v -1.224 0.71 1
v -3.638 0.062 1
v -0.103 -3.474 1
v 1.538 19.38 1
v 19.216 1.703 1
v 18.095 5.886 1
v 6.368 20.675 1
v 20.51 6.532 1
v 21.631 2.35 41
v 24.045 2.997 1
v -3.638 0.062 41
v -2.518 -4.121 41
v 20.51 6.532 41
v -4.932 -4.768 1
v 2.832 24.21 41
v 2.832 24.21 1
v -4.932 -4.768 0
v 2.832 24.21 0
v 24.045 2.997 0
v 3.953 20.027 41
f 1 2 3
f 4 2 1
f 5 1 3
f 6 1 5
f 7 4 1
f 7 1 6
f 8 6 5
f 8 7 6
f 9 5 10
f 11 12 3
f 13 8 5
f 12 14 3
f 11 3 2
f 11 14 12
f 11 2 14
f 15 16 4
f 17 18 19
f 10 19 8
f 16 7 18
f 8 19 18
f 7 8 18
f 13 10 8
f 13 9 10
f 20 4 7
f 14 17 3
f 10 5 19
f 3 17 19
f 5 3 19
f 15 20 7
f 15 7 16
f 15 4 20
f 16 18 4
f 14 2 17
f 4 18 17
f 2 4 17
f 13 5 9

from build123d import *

# Parameters (mm, degrees)
F1_DEPTH = 1
F3_DEPTH = 40
F5_DEPTH = 4.3311270189
F7_DEPTH = 25


with BuildPart() as f1:
    # F0 (on Top) → F1 (new body)
    with BuildSketch(Plane.XY):
        Polygon((2.8322214563, 24.2100603602), (-4.9323490894, -4.7677146448), (24.045425483, 2.9968575157), align=None)
    extrude(amount=F1_DEPTH)

    # F2 (on face) → F3 (join)
    with BuildSketch(Plane.XY.offset(1)):
        Polygon((-3.6382539984, 0.0619145227), (-4.9323490894, -4.7677146448), (-0.102719994, -3.4736192847), align=None)
        Polygon((6.3677554607, 20.6745265528), (2.8322214563, 24.2100603602), (1.5381263653, 19.3804311927), align=None)
        Polygon((19.2157963876, 1.7027621556), (24.045425483, 2.9968575157), (20.5098914785, 6.5323913231), align=None)
    extrude(amount=F3_DEPTH)

    # F4 (on face) → F5 (cut, through all)
    with BuildSketch(Plane(origin=(0.8615239687, -3.2152508648, 0), x_dir=(0.9659258191, 0.258819072, 0), z_dir=(0.258819072, -0.9659258191, 0))):
        Polygon((-5.9982588141, 41), (-5.9982588141, 1), (-3.4982588141, 41), align=None)
        Polygon((21.5017411859, 41), (24.0017411859, 1), (24.0017411859, 41), align=None)
        Polygon((-0.9982588141, 41), (-3.4982588141, 41), (-0.9982588141, 1), align=None)
        Polygon((19.0017411859, 41), (19.0017411859, 1), (21.5017411859, 41), align=None)
    extrude(amount=-F5_DEPTH, mode=Mode.SUBTRACT)

    # F6 (on face) → F7 (cut)
    with BuildSketch(Plane(origin=(-4.742073315, 17.6976565725, 0), x_dir=(0.9659258191, 0.258819072, 0), z_dir=(0.258819072, -0.9659258191, 0))):
        Polygon((6.5017411859, 41), (6.5017411859, 1), (9.0017411859, 41), align=None)
        Polygon((11.5017411859, 41), (9.0017411859, 41), (11.5017411859, 1), align=None)
    extrude(amount=-F7_DEPTH, mode=Mode.SUBTRACT)


solid = f1.part
